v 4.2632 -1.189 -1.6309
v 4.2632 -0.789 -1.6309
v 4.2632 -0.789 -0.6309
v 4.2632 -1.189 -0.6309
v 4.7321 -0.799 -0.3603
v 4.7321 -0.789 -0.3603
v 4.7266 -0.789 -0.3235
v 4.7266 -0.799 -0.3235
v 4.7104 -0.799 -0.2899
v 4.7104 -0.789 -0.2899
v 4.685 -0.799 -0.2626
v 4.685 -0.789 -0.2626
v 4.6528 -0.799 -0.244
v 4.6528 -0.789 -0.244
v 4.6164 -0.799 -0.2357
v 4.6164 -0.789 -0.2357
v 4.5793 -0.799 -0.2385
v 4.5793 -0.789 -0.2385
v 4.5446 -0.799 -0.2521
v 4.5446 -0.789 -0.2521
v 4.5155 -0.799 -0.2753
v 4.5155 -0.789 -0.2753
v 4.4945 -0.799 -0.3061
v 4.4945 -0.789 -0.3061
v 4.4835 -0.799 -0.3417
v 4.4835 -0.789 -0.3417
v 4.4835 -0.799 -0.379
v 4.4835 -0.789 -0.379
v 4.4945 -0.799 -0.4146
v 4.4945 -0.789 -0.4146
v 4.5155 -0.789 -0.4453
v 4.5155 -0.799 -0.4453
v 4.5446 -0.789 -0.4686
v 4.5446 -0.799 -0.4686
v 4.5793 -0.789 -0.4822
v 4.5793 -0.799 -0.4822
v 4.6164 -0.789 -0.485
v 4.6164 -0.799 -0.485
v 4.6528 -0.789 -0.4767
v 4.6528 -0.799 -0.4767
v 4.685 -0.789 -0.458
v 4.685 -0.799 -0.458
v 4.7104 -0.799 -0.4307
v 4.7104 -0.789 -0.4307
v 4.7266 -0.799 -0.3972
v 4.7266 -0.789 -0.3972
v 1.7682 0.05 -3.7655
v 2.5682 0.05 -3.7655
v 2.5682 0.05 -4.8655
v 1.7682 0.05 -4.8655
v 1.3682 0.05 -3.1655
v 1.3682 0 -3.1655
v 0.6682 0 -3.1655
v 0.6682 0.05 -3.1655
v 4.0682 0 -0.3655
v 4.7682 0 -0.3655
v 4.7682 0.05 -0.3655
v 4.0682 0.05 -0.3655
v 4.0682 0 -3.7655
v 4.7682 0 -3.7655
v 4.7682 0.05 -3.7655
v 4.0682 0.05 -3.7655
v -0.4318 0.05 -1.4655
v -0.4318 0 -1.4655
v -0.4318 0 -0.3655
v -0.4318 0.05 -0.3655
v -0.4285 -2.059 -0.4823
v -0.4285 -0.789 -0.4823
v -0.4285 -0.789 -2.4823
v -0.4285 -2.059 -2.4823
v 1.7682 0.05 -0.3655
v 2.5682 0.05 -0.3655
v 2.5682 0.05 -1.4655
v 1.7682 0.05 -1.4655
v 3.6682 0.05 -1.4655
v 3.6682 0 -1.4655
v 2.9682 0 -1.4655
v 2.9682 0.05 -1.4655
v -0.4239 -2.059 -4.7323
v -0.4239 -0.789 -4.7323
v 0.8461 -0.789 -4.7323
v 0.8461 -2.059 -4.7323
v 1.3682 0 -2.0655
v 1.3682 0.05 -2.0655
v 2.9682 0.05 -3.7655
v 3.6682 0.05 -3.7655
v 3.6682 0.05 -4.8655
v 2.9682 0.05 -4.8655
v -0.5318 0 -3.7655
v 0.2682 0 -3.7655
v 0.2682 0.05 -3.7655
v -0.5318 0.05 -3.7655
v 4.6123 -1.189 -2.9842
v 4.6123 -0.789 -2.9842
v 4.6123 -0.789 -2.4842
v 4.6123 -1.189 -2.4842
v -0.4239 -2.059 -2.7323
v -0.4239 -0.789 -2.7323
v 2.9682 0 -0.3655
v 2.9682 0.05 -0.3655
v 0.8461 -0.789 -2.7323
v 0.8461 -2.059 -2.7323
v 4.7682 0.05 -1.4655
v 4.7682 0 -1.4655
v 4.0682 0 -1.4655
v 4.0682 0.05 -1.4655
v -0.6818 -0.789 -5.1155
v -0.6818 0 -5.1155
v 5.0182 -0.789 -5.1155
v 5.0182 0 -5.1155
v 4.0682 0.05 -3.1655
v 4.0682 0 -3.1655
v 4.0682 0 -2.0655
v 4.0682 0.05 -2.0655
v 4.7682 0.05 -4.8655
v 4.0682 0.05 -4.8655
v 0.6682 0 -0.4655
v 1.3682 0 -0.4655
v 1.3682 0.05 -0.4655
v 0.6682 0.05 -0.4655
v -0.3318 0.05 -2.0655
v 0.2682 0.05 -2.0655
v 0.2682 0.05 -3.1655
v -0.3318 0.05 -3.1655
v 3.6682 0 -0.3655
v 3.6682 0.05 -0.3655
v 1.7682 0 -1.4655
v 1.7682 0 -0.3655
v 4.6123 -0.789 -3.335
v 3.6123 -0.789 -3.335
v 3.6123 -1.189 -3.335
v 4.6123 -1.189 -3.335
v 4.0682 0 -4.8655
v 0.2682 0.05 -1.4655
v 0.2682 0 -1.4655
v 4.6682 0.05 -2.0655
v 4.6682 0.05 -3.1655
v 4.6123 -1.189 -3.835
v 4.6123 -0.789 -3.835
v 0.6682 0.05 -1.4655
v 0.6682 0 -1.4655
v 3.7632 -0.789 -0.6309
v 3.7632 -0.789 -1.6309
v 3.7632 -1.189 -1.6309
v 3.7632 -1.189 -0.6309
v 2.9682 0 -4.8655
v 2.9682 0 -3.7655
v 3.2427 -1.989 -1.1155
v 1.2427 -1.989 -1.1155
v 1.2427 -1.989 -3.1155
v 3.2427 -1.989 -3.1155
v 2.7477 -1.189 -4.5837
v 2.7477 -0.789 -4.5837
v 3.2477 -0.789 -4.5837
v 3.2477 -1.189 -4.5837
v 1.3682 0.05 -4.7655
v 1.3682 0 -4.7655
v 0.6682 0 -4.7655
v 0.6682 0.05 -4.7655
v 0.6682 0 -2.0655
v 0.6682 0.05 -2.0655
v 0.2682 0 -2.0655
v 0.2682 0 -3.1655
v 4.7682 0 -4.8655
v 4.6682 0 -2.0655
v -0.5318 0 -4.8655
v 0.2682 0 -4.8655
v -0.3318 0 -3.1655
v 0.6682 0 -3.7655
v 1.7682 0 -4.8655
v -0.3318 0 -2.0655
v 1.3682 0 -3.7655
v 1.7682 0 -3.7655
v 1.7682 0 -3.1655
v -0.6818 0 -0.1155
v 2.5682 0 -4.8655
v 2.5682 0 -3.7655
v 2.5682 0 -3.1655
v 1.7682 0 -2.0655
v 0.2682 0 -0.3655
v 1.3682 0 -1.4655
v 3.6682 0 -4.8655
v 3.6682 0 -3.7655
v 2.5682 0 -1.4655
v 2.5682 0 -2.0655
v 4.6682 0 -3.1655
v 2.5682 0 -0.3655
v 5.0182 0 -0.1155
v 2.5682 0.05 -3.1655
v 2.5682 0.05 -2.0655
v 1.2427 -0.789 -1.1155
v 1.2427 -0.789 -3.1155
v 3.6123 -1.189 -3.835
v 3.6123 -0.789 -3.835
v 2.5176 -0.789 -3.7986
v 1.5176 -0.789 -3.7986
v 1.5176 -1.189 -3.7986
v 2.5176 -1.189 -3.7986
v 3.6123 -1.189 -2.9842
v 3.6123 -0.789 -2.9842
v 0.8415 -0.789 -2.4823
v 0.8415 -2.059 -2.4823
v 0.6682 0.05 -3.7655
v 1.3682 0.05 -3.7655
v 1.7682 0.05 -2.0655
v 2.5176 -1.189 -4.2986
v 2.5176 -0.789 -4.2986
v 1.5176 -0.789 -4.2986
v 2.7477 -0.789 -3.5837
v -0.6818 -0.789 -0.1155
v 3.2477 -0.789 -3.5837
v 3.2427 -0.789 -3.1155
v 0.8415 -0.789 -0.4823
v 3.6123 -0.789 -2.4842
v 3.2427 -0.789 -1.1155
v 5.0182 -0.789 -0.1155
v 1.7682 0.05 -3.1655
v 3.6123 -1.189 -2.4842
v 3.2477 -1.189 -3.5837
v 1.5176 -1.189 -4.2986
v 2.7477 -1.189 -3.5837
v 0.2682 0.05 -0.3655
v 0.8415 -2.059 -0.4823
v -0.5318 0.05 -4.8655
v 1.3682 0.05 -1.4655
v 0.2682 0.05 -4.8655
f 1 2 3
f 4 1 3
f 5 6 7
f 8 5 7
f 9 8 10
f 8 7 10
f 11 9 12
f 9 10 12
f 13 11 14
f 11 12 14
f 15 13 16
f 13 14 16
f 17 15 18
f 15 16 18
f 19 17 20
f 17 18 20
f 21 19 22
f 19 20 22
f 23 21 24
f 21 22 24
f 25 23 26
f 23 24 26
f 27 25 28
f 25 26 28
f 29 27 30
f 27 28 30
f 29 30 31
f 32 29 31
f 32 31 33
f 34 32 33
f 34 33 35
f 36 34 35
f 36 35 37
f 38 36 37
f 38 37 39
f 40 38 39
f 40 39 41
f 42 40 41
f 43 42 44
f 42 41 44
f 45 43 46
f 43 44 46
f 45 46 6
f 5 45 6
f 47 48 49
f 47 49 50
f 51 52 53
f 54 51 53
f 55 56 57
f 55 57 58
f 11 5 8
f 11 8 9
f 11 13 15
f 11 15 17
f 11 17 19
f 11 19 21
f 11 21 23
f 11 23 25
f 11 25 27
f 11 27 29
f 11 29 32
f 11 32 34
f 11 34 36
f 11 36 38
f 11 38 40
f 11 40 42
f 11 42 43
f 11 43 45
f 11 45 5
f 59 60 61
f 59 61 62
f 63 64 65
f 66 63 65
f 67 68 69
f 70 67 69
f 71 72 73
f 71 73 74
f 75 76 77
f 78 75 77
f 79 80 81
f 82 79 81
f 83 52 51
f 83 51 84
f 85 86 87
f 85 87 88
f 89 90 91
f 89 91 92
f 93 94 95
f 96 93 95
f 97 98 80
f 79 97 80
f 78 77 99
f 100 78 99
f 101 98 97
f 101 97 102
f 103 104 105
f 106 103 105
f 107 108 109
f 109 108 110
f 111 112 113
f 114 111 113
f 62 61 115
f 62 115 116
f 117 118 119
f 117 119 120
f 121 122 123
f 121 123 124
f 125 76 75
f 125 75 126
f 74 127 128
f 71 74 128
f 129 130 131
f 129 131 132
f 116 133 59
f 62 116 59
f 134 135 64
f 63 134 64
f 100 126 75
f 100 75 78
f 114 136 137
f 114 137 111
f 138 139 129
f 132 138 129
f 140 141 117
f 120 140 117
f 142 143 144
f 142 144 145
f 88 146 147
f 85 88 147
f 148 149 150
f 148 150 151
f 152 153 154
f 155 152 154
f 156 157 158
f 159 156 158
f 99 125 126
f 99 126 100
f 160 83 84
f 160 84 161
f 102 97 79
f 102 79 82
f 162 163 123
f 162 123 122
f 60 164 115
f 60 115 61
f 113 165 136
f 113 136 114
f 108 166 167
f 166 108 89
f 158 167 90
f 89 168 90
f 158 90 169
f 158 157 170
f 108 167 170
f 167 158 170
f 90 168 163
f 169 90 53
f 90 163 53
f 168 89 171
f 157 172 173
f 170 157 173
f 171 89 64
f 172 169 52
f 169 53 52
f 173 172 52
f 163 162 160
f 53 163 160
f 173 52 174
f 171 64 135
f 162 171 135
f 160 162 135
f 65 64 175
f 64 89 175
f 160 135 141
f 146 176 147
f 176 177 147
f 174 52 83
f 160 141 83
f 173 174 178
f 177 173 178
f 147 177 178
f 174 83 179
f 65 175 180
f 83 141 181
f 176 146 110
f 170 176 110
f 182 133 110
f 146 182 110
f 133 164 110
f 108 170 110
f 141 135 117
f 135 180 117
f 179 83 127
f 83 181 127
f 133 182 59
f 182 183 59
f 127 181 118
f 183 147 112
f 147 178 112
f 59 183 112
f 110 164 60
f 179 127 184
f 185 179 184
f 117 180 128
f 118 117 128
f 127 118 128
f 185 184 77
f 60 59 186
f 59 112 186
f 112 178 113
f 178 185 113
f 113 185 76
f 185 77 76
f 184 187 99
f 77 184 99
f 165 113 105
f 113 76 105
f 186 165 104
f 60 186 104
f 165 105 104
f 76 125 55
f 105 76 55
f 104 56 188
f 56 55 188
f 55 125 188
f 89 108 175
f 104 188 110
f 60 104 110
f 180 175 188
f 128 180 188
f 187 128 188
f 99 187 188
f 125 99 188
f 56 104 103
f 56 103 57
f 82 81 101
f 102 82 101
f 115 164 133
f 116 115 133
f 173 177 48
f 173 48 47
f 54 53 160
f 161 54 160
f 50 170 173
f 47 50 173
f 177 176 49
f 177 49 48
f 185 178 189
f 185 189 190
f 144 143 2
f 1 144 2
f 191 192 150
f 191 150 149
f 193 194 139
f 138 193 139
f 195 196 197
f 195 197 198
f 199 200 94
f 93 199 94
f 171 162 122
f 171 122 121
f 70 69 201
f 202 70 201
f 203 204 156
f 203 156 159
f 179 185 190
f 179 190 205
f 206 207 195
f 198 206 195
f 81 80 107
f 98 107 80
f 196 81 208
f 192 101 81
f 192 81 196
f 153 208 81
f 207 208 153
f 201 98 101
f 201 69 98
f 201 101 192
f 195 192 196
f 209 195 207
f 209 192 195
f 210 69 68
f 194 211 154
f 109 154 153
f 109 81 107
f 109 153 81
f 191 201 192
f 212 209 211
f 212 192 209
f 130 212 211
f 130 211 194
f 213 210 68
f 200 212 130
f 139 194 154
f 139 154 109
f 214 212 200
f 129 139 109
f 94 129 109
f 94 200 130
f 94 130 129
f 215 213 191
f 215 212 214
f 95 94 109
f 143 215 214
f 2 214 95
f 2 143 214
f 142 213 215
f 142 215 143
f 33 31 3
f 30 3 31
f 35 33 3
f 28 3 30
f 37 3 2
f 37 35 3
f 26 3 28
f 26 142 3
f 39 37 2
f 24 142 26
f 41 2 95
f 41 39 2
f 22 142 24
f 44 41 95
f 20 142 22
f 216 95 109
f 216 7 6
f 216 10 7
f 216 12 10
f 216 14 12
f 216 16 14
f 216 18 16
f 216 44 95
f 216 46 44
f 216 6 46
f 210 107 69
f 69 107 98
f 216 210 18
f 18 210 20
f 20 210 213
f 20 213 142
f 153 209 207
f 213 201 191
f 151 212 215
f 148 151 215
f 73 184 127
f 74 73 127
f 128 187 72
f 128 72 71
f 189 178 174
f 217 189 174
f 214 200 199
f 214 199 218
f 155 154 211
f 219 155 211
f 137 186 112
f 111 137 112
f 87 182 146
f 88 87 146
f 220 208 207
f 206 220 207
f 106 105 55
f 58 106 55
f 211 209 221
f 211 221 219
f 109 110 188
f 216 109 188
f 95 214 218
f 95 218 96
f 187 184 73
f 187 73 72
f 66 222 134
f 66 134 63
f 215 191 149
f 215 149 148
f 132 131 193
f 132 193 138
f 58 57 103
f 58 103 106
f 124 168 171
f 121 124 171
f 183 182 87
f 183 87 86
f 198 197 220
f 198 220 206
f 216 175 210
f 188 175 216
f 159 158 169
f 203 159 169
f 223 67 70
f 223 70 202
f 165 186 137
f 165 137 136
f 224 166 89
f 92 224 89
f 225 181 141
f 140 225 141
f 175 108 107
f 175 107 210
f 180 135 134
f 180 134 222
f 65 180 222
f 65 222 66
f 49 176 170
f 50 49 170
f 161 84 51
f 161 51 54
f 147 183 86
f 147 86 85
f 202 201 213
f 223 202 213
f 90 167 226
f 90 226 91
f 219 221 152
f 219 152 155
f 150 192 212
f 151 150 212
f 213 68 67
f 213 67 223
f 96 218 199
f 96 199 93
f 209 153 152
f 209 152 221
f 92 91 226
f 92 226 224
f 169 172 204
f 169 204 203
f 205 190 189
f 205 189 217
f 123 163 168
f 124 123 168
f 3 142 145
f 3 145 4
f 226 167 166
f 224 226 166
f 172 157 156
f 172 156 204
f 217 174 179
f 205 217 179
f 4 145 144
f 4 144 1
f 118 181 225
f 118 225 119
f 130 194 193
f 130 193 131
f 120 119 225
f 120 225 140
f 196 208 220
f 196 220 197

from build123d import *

# Parameters (mm, degrees)
F0_W      = 5.7
F0_H      = 5
F1_DEPTH  = 0.789
F2_W      = 2
F2_H      = 2
F3_DEPTH  = 1.2
F4_W      = 1.27
F4_H      = 0.5
F4_H_2    = 1
F5_DEPTH  = 1.27
F6_W      = 1
F6_H      = 0.5
F6_W_2    = 0.5
F6_H_2    = 1
F7_DEPTH  = 0.4
F8_R      = 0.125
F9_DEPTH  = 0.01
F10_W     = 0.7
F10_H     = 1.1
F10_W_2   = 0.6
F10_W_3   = 0.8
F10_H_2   = 1
F11_DEPTH = 0.05


with BuildPart() as f1:
    # F0 (on Front) → F1 (new body)
    with BuildSketch(Plane.XZ):
        with Locations((2.168227, -2.615547)):
            Rectangle(F0_W, F0_H)
    extrude(amount=F1_DEPTH)

    # F2 (on face) → F3 (join)
    with BuildSketch(Plane.XZ.offset(0.789)):
        with Locations((2.242705, -2.115547)):
            Rectangle(F2_W, F2_H)
    extrude(amount=F3_DEPTH)

    # F4 (on face) → F5 (join)
    with BuildSketch(Plane.XZ.offset(0.789)):
        with Locations((0.206497, -0.732273)):
            Rectangle(F4_W, F4_H)
        with Locations((0.206497, -1.482273)):
            Rectangle(F4_W, F4_H_2)
        Polygon((0.841497, -1.982273), (-0.428503, -1.982273), (-0.428503, -2.036124), (-0.428503, -2.482273), (0.841497, -2.482273), (0.841497, -2.036124), align=None)
        with Locations((0.21112, -2.982335)):
            Rectangle(F4_W, F4_H)
        with Locations((0.21112, -3.732335)):
            Rectangle(F4_W, F4_H_2)
        with Locations((0.21112, -4.482335)):
            Rectangle(F4_W, F4_H)
    extrude(amount=F5_DEPTH)

    # F6 (on face) → F7 (join)
    with BuildSketch(Plane.XZ.offset(0.789)):
        with Locations((2.017631, -4.048583)):
            Rectangle(F6_W, F6_H)
        with Locations((2.997681, -4.083691)):
            Rectangle(F6_W_2, F6_H_2)
        with Locations((4.112315, -3.584963)):
            Rectangle(F6_W, F6_H)
        with Locations((4.112315, -2.734225)):
            Rectangle(F6_W, F6_H)
        with Locations((4.013168, -1.130892)):
            Rectangle(F6_W_2, F6_H_2)
    extrude(amount=F7_DEPTH)

    # F8 (on face) → F9 (join)
    with BuildSketch(Plane.XZ.offset(0.789)):
        with Locations((4.607105, -0.36032)):
            Circle(F8_R)
    extrude(amount=F9_DEPTH)

    # F10 (on face) → F11 (join)
    with BuildSketch(Plane(origin=(0, 0, 0), x_dir=(-1, 0, 0), z_dir=(0, 1, 0))):
        with Locations((-4.418227, -4.315547)):
            Rectangle(F10_W, F10_H)
        with Locations((-4.368227, -2.615547)):
            Rectangle(F10_W_2, F10_H)
        with Locations((-2.168227, -2.615547)):
            Rectangle(F10_W_3, F10_H)
        with Locations((-1.018227, -2.615547)):
            Rectangle(F10_W, F10_H)
        with Locations((-3.318227, -4.315547)):
            Rectangle(F10_W, F10_H)
        with Locations((-2.168227, -4.315547)):
            Rectangle(F10_W_3, F10_H)
        with Locations((-1.018227, -4.265547)):
            Rectangle(F10_W, F10_H_2)
        with Locations((-4.418227, -0.915547)):
            Rectangle(F10_W, F10_H)
        with Locations((-3.318227, -0.915547)):
            Rectangle(F10_W, F10_H)
        with Locations((-2.168227, -0.915547)):
            Rectangle(F10_W_3, F10_H)
        with Locations((-1.018227, -0.965547)):
            Rectangle(F10_W, F10_H_2)
        with Locations((0.131773, -4.315547)):
            Rectangle(F10_W_3, F10_H)
        with Locations((0.031773, -2.615547)):
            Rectangle(F10_W_2, F10_H)
        with Locations((0.081773, -0.915547)):
            Rectangle(F10_W, F10_H)
    extrude(amount=F11_DEPTH)


solid = f1.part
